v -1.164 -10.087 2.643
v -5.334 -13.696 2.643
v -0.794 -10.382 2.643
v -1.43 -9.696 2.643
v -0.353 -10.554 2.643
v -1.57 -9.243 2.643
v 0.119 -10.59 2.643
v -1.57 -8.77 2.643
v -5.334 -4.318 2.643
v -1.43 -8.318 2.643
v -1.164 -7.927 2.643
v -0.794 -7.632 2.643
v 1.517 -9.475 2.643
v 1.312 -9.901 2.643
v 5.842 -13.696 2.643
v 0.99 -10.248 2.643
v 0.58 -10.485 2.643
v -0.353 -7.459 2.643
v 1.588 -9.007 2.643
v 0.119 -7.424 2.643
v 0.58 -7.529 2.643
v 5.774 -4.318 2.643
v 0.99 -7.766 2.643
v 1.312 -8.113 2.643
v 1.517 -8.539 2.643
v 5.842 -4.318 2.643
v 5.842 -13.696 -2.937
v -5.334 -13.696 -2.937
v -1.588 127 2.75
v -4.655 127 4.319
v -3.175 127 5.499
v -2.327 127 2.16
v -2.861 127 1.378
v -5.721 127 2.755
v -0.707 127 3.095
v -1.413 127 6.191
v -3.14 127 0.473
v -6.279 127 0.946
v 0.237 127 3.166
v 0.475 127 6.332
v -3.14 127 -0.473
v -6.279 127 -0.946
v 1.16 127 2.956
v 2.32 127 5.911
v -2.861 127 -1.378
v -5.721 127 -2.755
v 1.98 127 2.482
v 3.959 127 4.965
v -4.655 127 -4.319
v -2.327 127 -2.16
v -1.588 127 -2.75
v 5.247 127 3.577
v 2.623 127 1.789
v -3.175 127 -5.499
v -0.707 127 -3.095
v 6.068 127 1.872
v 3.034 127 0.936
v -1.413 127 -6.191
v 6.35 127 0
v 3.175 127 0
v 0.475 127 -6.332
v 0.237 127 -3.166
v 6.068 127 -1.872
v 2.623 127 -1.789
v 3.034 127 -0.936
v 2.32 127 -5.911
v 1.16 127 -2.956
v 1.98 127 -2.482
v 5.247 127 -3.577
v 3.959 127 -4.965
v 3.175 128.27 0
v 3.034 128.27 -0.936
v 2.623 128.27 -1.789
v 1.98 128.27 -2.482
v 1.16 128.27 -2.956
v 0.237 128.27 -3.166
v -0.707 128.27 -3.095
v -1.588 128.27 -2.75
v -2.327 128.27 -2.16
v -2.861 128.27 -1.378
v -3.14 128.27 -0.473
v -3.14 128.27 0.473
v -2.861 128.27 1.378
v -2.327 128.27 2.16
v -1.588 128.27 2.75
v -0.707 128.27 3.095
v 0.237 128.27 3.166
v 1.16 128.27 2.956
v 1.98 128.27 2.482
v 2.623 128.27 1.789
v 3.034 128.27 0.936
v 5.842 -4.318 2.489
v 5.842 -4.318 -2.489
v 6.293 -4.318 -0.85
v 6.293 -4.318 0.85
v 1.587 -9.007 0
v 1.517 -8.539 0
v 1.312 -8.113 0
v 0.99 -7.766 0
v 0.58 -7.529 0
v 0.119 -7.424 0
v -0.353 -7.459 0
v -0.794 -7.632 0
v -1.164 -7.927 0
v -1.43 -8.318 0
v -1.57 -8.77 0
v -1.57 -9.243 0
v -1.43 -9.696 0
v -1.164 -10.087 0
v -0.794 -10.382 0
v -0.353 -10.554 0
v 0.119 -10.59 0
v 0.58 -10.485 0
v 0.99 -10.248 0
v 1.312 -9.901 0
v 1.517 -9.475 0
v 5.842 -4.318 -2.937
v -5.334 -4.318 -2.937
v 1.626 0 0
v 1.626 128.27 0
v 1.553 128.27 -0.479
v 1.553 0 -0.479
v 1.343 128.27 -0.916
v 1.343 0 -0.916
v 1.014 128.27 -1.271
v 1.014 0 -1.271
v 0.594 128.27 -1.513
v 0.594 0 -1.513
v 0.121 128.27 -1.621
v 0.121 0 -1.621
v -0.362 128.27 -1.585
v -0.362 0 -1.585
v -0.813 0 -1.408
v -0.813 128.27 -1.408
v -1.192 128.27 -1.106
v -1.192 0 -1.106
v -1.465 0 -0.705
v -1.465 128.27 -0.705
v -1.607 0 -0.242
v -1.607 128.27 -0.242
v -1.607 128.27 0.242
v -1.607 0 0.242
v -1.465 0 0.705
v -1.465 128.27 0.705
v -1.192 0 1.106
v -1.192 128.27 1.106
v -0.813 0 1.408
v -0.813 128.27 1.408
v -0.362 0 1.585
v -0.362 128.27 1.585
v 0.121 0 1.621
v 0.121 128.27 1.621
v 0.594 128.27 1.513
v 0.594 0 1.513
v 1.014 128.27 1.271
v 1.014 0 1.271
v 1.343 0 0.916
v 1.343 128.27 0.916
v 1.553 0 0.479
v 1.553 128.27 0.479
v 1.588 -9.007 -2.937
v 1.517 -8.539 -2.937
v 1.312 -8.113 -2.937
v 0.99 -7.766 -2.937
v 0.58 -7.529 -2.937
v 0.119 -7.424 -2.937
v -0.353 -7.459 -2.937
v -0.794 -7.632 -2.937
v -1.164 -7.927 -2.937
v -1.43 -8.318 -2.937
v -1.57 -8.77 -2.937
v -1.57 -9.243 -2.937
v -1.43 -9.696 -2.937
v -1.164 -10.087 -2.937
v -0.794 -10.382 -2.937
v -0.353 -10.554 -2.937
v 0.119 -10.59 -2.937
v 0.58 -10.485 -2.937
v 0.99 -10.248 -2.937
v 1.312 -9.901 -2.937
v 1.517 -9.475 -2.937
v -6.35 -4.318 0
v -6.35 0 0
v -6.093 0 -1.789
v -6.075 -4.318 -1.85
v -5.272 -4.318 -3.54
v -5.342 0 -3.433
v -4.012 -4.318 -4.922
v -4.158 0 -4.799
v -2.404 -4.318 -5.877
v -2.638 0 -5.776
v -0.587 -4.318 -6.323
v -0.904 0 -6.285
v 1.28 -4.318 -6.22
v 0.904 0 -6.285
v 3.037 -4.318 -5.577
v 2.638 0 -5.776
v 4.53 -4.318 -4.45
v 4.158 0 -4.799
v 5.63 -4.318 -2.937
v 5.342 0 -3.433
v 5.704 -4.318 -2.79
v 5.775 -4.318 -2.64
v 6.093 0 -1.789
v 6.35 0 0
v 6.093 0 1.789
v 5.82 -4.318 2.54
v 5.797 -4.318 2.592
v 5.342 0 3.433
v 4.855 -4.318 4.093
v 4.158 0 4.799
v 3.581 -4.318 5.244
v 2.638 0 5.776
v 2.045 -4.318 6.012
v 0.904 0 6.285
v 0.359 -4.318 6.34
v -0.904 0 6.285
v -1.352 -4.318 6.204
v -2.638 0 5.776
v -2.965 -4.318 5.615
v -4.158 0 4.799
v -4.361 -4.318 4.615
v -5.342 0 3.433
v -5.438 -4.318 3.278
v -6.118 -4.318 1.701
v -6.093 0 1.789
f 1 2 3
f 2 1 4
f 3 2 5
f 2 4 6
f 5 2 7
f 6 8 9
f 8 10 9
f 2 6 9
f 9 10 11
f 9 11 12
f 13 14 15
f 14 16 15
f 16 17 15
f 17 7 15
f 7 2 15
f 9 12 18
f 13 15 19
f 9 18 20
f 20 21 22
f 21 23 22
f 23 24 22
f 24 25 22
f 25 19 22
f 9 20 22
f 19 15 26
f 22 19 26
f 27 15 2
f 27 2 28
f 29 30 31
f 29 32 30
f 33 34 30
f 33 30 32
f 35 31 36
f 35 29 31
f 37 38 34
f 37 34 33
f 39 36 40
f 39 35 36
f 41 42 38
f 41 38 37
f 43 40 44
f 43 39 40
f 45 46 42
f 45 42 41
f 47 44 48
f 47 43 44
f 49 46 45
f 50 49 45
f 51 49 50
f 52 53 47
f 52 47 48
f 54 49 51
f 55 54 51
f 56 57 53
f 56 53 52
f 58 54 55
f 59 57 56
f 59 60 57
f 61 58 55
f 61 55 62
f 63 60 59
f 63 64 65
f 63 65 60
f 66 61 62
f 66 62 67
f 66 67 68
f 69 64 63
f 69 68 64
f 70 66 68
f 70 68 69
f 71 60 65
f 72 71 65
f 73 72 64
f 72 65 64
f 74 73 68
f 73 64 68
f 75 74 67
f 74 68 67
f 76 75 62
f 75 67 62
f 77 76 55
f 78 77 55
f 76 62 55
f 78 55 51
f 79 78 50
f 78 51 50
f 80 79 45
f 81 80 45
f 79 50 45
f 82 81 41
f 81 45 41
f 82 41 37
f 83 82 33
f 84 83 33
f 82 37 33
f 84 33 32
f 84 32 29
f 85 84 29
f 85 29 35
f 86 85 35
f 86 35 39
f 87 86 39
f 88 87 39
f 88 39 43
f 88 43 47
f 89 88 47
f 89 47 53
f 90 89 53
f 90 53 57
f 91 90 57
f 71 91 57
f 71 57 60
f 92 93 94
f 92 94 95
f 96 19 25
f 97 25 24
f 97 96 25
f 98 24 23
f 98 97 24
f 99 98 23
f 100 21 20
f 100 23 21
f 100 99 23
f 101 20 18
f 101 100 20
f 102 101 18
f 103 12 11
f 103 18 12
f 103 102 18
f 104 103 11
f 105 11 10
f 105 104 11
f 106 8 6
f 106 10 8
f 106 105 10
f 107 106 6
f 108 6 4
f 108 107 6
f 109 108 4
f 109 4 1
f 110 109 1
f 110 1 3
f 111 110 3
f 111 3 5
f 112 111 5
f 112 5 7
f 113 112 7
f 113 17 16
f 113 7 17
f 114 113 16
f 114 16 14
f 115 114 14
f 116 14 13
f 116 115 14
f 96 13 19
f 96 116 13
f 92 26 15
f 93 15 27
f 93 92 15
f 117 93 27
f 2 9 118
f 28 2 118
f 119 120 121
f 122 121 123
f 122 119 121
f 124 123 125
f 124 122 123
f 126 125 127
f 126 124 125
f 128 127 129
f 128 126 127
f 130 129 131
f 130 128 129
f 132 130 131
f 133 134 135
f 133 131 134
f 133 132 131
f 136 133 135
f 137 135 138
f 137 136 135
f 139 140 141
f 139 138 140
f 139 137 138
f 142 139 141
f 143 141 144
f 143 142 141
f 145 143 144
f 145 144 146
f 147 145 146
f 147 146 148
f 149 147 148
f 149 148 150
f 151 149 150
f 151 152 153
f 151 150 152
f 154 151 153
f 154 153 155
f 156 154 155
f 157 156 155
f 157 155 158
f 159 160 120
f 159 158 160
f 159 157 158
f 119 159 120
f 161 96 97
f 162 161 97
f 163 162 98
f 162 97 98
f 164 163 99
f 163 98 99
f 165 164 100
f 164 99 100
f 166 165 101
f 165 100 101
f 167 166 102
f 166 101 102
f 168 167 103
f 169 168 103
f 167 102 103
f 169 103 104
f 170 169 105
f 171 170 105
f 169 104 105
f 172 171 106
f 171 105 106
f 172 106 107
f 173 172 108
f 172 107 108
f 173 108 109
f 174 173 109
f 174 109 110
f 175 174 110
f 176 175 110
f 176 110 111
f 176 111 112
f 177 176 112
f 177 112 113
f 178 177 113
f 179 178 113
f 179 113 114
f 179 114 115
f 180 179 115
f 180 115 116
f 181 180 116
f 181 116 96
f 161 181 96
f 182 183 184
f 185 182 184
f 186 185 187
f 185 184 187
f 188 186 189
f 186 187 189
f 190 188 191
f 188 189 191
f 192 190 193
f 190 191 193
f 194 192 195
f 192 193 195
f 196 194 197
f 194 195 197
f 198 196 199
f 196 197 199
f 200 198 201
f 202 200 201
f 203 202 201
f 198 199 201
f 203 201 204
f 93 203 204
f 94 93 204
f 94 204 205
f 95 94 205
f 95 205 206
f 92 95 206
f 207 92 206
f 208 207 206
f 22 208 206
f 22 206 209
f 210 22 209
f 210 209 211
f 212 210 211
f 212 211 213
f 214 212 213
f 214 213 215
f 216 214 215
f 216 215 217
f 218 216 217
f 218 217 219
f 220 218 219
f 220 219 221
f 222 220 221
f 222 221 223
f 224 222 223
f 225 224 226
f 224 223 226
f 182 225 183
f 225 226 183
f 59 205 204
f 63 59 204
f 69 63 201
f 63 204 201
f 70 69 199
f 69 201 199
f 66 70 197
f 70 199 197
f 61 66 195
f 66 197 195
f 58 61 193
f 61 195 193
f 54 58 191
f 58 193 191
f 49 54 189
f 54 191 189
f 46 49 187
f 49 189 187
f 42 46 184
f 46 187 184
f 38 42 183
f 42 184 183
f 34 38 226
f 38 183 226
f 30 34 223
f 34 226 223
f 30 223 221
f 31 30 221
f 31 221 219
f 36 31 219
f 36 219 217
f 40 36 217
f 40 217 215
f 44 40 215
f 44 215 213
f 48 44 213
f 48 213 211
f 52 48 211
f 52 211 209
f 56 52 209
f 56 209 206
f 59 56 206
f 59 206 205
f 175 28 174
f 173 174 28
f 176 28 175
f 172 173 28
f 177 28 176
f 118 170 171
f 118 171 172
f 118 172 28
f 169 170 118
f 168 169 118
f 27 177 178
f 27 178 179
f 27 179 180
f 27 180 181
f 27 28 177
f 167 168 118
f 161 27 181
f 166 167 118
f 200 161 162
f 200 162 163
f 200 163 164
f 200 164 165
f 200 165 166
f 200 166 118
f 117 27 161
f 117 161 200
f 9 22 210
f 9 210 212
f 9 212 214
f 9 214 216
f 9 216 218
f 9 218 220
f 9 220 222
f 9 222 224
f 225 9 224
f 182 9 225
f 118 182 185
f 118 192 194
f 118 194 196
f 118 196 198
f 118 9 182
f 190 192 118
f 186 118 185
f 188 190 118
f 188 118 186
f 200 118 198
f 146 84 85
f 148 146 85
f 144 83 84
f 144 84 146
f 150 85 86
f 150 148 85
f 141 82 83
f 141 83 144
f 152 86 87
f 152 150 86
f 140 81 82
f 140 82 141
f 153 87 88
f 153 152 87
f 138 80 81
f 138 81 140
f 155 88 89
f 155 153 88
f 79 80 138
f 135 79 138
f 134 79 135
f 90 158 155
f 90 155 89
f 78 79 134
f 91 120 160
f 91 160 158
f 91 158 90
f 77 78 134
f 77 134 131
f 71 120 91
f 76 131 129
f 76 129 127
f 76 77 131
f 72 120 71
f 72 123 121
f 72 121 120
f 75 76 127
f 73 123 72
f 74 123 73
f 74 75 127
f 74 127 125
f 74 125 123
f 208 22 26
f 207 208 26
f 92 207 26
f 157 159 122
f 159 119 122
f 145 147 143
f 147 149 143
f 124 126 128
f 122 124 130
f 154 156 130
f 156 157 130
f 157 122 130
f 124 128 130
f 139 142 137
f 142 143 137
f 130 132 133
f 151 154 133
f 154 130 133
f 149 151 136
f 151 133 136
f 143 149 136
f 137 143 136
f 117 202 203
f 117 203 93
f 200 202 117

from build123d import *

# Parameters (mm, degrees)
CROQUIS1_R                   = 6.35
SALIENTE_EXTRUIR1_DEPTH      = 127
CROQUIS2_R                   = 3.175
SALIENTE_EXTRUIR2_DEPTH      = 128.27
CROQUIS3_R                   = 1.6256
CORTAR_EXTRUIR1_DEPTH        = 135.128
CORTAR_EXTRUIR1_DEPTH_BACK   = 0.254
CROQUIS4_R                   = 6.35
SALIENTE_EXTRUIR3_DEPTH      = 4.318
CROQUIS5_W                   = 5.579827166
CROQUIS5_H                   = 9.377569363
SALIENTE_EXTRUIR5_DEPTH      = 5.842
SALIENTE_EXTRUIR5_DEPTH_BACK = 5.334
CROQUIS8_R                   = 1.5875
CORTAR_EXTRUIR2_DEPTH        = 23.876
CORTAR_EXTRUIR2_DEPTH_BACK   = 64.262


with BuildPart() as part:
    # Croquis1 → Saliente-Extruir1 (new body)
    with BuildSketch(Plane(origin=(0, 0, 0), x_dir=(1, 0, 0), z_dir=(0, 1, 0))):
        Circle(CROQUIS1_R)
    extrude(amount=SALIENTE_EXTRUIR1_DEPTH)

    # Croquis2 → Saliente-Extruir2 (add)
    with BuildSketch(Plane(origin=(0, 0, 0), x_dir=(1, 0, 0), z_dir=(0, 1, 0))):
        Circle(CROQUIS2_R)
    extrude(amount=SALIENTE_EXTRUIR2_DEPTH)

    # Croquis3 → Cortar-Extruir1 (cut, two sides)
    with BuildSketch(Plane(origin=(0, 0, 0), x_dir=(1, 0, 0), z_dir=(0, 1, 0))) as cortar_extruir1_sk:
        Circle(CROQUIS3_R)
    extrude(amount=CORTAR_EXTRUIR1_DEPTH, mode=Mode.SUBTRACT)
    extrude(cortar_extruir1_sk.sketch, amount=-CORTAR_EXTRUIR1_DEPTH_BACK, mode=Mode.SUBTRACT)

    # Croquis4 → Saliente-Extruir3 (add)
    with BuildSketch(Plane(origin=(0, 0, 0), x_dir=(-1, 0, 0), z_dir=(0, -1, 0))):
        Circle(CROQUIS4_R)
    extrude(amount=SALIENTE_EXTRUIR3_DEPTH)

    # Croquis5 → Saliente-Extruir5 (add, two sides)
    with BuildSketch(Plane(origin=(0, 0, 0), x_dir=(0, 0, -1), z_dir=(1, 0, 0))) as saliente_extruir5_sk:
        with Locations((0.147287334, -9.006784682)):
            Rectangle(CROQUIS5_W, CROQUIS5_H)
    extrude(amount=SALIENTE_EXTRUIR5_DEPTH)
    extrude(saliente_extruir5_sk.sketch, amount=-SALIENTE_EXTRUIR5_DEPTH_BACK)

    # Croquis8 → Cortar-Extruir2 (cut, two sides)
    with BuildSketch(Plane.XY) as cortar_extruir2_sk:
        with Locations((0, -9.006784681)):
            Circle(CROQUIS8_R)
    extrude(amount=CORTAR_EXTRUIR2_DEPTH, mode=Mode.SUBTRACT)
    extrude(cortar_extruir2_sk.sketch, amount=-CORTAR_EXTRUIR2_DEPTH_BACK, mode=Mode.SUBTRACT)


solid = part.part
